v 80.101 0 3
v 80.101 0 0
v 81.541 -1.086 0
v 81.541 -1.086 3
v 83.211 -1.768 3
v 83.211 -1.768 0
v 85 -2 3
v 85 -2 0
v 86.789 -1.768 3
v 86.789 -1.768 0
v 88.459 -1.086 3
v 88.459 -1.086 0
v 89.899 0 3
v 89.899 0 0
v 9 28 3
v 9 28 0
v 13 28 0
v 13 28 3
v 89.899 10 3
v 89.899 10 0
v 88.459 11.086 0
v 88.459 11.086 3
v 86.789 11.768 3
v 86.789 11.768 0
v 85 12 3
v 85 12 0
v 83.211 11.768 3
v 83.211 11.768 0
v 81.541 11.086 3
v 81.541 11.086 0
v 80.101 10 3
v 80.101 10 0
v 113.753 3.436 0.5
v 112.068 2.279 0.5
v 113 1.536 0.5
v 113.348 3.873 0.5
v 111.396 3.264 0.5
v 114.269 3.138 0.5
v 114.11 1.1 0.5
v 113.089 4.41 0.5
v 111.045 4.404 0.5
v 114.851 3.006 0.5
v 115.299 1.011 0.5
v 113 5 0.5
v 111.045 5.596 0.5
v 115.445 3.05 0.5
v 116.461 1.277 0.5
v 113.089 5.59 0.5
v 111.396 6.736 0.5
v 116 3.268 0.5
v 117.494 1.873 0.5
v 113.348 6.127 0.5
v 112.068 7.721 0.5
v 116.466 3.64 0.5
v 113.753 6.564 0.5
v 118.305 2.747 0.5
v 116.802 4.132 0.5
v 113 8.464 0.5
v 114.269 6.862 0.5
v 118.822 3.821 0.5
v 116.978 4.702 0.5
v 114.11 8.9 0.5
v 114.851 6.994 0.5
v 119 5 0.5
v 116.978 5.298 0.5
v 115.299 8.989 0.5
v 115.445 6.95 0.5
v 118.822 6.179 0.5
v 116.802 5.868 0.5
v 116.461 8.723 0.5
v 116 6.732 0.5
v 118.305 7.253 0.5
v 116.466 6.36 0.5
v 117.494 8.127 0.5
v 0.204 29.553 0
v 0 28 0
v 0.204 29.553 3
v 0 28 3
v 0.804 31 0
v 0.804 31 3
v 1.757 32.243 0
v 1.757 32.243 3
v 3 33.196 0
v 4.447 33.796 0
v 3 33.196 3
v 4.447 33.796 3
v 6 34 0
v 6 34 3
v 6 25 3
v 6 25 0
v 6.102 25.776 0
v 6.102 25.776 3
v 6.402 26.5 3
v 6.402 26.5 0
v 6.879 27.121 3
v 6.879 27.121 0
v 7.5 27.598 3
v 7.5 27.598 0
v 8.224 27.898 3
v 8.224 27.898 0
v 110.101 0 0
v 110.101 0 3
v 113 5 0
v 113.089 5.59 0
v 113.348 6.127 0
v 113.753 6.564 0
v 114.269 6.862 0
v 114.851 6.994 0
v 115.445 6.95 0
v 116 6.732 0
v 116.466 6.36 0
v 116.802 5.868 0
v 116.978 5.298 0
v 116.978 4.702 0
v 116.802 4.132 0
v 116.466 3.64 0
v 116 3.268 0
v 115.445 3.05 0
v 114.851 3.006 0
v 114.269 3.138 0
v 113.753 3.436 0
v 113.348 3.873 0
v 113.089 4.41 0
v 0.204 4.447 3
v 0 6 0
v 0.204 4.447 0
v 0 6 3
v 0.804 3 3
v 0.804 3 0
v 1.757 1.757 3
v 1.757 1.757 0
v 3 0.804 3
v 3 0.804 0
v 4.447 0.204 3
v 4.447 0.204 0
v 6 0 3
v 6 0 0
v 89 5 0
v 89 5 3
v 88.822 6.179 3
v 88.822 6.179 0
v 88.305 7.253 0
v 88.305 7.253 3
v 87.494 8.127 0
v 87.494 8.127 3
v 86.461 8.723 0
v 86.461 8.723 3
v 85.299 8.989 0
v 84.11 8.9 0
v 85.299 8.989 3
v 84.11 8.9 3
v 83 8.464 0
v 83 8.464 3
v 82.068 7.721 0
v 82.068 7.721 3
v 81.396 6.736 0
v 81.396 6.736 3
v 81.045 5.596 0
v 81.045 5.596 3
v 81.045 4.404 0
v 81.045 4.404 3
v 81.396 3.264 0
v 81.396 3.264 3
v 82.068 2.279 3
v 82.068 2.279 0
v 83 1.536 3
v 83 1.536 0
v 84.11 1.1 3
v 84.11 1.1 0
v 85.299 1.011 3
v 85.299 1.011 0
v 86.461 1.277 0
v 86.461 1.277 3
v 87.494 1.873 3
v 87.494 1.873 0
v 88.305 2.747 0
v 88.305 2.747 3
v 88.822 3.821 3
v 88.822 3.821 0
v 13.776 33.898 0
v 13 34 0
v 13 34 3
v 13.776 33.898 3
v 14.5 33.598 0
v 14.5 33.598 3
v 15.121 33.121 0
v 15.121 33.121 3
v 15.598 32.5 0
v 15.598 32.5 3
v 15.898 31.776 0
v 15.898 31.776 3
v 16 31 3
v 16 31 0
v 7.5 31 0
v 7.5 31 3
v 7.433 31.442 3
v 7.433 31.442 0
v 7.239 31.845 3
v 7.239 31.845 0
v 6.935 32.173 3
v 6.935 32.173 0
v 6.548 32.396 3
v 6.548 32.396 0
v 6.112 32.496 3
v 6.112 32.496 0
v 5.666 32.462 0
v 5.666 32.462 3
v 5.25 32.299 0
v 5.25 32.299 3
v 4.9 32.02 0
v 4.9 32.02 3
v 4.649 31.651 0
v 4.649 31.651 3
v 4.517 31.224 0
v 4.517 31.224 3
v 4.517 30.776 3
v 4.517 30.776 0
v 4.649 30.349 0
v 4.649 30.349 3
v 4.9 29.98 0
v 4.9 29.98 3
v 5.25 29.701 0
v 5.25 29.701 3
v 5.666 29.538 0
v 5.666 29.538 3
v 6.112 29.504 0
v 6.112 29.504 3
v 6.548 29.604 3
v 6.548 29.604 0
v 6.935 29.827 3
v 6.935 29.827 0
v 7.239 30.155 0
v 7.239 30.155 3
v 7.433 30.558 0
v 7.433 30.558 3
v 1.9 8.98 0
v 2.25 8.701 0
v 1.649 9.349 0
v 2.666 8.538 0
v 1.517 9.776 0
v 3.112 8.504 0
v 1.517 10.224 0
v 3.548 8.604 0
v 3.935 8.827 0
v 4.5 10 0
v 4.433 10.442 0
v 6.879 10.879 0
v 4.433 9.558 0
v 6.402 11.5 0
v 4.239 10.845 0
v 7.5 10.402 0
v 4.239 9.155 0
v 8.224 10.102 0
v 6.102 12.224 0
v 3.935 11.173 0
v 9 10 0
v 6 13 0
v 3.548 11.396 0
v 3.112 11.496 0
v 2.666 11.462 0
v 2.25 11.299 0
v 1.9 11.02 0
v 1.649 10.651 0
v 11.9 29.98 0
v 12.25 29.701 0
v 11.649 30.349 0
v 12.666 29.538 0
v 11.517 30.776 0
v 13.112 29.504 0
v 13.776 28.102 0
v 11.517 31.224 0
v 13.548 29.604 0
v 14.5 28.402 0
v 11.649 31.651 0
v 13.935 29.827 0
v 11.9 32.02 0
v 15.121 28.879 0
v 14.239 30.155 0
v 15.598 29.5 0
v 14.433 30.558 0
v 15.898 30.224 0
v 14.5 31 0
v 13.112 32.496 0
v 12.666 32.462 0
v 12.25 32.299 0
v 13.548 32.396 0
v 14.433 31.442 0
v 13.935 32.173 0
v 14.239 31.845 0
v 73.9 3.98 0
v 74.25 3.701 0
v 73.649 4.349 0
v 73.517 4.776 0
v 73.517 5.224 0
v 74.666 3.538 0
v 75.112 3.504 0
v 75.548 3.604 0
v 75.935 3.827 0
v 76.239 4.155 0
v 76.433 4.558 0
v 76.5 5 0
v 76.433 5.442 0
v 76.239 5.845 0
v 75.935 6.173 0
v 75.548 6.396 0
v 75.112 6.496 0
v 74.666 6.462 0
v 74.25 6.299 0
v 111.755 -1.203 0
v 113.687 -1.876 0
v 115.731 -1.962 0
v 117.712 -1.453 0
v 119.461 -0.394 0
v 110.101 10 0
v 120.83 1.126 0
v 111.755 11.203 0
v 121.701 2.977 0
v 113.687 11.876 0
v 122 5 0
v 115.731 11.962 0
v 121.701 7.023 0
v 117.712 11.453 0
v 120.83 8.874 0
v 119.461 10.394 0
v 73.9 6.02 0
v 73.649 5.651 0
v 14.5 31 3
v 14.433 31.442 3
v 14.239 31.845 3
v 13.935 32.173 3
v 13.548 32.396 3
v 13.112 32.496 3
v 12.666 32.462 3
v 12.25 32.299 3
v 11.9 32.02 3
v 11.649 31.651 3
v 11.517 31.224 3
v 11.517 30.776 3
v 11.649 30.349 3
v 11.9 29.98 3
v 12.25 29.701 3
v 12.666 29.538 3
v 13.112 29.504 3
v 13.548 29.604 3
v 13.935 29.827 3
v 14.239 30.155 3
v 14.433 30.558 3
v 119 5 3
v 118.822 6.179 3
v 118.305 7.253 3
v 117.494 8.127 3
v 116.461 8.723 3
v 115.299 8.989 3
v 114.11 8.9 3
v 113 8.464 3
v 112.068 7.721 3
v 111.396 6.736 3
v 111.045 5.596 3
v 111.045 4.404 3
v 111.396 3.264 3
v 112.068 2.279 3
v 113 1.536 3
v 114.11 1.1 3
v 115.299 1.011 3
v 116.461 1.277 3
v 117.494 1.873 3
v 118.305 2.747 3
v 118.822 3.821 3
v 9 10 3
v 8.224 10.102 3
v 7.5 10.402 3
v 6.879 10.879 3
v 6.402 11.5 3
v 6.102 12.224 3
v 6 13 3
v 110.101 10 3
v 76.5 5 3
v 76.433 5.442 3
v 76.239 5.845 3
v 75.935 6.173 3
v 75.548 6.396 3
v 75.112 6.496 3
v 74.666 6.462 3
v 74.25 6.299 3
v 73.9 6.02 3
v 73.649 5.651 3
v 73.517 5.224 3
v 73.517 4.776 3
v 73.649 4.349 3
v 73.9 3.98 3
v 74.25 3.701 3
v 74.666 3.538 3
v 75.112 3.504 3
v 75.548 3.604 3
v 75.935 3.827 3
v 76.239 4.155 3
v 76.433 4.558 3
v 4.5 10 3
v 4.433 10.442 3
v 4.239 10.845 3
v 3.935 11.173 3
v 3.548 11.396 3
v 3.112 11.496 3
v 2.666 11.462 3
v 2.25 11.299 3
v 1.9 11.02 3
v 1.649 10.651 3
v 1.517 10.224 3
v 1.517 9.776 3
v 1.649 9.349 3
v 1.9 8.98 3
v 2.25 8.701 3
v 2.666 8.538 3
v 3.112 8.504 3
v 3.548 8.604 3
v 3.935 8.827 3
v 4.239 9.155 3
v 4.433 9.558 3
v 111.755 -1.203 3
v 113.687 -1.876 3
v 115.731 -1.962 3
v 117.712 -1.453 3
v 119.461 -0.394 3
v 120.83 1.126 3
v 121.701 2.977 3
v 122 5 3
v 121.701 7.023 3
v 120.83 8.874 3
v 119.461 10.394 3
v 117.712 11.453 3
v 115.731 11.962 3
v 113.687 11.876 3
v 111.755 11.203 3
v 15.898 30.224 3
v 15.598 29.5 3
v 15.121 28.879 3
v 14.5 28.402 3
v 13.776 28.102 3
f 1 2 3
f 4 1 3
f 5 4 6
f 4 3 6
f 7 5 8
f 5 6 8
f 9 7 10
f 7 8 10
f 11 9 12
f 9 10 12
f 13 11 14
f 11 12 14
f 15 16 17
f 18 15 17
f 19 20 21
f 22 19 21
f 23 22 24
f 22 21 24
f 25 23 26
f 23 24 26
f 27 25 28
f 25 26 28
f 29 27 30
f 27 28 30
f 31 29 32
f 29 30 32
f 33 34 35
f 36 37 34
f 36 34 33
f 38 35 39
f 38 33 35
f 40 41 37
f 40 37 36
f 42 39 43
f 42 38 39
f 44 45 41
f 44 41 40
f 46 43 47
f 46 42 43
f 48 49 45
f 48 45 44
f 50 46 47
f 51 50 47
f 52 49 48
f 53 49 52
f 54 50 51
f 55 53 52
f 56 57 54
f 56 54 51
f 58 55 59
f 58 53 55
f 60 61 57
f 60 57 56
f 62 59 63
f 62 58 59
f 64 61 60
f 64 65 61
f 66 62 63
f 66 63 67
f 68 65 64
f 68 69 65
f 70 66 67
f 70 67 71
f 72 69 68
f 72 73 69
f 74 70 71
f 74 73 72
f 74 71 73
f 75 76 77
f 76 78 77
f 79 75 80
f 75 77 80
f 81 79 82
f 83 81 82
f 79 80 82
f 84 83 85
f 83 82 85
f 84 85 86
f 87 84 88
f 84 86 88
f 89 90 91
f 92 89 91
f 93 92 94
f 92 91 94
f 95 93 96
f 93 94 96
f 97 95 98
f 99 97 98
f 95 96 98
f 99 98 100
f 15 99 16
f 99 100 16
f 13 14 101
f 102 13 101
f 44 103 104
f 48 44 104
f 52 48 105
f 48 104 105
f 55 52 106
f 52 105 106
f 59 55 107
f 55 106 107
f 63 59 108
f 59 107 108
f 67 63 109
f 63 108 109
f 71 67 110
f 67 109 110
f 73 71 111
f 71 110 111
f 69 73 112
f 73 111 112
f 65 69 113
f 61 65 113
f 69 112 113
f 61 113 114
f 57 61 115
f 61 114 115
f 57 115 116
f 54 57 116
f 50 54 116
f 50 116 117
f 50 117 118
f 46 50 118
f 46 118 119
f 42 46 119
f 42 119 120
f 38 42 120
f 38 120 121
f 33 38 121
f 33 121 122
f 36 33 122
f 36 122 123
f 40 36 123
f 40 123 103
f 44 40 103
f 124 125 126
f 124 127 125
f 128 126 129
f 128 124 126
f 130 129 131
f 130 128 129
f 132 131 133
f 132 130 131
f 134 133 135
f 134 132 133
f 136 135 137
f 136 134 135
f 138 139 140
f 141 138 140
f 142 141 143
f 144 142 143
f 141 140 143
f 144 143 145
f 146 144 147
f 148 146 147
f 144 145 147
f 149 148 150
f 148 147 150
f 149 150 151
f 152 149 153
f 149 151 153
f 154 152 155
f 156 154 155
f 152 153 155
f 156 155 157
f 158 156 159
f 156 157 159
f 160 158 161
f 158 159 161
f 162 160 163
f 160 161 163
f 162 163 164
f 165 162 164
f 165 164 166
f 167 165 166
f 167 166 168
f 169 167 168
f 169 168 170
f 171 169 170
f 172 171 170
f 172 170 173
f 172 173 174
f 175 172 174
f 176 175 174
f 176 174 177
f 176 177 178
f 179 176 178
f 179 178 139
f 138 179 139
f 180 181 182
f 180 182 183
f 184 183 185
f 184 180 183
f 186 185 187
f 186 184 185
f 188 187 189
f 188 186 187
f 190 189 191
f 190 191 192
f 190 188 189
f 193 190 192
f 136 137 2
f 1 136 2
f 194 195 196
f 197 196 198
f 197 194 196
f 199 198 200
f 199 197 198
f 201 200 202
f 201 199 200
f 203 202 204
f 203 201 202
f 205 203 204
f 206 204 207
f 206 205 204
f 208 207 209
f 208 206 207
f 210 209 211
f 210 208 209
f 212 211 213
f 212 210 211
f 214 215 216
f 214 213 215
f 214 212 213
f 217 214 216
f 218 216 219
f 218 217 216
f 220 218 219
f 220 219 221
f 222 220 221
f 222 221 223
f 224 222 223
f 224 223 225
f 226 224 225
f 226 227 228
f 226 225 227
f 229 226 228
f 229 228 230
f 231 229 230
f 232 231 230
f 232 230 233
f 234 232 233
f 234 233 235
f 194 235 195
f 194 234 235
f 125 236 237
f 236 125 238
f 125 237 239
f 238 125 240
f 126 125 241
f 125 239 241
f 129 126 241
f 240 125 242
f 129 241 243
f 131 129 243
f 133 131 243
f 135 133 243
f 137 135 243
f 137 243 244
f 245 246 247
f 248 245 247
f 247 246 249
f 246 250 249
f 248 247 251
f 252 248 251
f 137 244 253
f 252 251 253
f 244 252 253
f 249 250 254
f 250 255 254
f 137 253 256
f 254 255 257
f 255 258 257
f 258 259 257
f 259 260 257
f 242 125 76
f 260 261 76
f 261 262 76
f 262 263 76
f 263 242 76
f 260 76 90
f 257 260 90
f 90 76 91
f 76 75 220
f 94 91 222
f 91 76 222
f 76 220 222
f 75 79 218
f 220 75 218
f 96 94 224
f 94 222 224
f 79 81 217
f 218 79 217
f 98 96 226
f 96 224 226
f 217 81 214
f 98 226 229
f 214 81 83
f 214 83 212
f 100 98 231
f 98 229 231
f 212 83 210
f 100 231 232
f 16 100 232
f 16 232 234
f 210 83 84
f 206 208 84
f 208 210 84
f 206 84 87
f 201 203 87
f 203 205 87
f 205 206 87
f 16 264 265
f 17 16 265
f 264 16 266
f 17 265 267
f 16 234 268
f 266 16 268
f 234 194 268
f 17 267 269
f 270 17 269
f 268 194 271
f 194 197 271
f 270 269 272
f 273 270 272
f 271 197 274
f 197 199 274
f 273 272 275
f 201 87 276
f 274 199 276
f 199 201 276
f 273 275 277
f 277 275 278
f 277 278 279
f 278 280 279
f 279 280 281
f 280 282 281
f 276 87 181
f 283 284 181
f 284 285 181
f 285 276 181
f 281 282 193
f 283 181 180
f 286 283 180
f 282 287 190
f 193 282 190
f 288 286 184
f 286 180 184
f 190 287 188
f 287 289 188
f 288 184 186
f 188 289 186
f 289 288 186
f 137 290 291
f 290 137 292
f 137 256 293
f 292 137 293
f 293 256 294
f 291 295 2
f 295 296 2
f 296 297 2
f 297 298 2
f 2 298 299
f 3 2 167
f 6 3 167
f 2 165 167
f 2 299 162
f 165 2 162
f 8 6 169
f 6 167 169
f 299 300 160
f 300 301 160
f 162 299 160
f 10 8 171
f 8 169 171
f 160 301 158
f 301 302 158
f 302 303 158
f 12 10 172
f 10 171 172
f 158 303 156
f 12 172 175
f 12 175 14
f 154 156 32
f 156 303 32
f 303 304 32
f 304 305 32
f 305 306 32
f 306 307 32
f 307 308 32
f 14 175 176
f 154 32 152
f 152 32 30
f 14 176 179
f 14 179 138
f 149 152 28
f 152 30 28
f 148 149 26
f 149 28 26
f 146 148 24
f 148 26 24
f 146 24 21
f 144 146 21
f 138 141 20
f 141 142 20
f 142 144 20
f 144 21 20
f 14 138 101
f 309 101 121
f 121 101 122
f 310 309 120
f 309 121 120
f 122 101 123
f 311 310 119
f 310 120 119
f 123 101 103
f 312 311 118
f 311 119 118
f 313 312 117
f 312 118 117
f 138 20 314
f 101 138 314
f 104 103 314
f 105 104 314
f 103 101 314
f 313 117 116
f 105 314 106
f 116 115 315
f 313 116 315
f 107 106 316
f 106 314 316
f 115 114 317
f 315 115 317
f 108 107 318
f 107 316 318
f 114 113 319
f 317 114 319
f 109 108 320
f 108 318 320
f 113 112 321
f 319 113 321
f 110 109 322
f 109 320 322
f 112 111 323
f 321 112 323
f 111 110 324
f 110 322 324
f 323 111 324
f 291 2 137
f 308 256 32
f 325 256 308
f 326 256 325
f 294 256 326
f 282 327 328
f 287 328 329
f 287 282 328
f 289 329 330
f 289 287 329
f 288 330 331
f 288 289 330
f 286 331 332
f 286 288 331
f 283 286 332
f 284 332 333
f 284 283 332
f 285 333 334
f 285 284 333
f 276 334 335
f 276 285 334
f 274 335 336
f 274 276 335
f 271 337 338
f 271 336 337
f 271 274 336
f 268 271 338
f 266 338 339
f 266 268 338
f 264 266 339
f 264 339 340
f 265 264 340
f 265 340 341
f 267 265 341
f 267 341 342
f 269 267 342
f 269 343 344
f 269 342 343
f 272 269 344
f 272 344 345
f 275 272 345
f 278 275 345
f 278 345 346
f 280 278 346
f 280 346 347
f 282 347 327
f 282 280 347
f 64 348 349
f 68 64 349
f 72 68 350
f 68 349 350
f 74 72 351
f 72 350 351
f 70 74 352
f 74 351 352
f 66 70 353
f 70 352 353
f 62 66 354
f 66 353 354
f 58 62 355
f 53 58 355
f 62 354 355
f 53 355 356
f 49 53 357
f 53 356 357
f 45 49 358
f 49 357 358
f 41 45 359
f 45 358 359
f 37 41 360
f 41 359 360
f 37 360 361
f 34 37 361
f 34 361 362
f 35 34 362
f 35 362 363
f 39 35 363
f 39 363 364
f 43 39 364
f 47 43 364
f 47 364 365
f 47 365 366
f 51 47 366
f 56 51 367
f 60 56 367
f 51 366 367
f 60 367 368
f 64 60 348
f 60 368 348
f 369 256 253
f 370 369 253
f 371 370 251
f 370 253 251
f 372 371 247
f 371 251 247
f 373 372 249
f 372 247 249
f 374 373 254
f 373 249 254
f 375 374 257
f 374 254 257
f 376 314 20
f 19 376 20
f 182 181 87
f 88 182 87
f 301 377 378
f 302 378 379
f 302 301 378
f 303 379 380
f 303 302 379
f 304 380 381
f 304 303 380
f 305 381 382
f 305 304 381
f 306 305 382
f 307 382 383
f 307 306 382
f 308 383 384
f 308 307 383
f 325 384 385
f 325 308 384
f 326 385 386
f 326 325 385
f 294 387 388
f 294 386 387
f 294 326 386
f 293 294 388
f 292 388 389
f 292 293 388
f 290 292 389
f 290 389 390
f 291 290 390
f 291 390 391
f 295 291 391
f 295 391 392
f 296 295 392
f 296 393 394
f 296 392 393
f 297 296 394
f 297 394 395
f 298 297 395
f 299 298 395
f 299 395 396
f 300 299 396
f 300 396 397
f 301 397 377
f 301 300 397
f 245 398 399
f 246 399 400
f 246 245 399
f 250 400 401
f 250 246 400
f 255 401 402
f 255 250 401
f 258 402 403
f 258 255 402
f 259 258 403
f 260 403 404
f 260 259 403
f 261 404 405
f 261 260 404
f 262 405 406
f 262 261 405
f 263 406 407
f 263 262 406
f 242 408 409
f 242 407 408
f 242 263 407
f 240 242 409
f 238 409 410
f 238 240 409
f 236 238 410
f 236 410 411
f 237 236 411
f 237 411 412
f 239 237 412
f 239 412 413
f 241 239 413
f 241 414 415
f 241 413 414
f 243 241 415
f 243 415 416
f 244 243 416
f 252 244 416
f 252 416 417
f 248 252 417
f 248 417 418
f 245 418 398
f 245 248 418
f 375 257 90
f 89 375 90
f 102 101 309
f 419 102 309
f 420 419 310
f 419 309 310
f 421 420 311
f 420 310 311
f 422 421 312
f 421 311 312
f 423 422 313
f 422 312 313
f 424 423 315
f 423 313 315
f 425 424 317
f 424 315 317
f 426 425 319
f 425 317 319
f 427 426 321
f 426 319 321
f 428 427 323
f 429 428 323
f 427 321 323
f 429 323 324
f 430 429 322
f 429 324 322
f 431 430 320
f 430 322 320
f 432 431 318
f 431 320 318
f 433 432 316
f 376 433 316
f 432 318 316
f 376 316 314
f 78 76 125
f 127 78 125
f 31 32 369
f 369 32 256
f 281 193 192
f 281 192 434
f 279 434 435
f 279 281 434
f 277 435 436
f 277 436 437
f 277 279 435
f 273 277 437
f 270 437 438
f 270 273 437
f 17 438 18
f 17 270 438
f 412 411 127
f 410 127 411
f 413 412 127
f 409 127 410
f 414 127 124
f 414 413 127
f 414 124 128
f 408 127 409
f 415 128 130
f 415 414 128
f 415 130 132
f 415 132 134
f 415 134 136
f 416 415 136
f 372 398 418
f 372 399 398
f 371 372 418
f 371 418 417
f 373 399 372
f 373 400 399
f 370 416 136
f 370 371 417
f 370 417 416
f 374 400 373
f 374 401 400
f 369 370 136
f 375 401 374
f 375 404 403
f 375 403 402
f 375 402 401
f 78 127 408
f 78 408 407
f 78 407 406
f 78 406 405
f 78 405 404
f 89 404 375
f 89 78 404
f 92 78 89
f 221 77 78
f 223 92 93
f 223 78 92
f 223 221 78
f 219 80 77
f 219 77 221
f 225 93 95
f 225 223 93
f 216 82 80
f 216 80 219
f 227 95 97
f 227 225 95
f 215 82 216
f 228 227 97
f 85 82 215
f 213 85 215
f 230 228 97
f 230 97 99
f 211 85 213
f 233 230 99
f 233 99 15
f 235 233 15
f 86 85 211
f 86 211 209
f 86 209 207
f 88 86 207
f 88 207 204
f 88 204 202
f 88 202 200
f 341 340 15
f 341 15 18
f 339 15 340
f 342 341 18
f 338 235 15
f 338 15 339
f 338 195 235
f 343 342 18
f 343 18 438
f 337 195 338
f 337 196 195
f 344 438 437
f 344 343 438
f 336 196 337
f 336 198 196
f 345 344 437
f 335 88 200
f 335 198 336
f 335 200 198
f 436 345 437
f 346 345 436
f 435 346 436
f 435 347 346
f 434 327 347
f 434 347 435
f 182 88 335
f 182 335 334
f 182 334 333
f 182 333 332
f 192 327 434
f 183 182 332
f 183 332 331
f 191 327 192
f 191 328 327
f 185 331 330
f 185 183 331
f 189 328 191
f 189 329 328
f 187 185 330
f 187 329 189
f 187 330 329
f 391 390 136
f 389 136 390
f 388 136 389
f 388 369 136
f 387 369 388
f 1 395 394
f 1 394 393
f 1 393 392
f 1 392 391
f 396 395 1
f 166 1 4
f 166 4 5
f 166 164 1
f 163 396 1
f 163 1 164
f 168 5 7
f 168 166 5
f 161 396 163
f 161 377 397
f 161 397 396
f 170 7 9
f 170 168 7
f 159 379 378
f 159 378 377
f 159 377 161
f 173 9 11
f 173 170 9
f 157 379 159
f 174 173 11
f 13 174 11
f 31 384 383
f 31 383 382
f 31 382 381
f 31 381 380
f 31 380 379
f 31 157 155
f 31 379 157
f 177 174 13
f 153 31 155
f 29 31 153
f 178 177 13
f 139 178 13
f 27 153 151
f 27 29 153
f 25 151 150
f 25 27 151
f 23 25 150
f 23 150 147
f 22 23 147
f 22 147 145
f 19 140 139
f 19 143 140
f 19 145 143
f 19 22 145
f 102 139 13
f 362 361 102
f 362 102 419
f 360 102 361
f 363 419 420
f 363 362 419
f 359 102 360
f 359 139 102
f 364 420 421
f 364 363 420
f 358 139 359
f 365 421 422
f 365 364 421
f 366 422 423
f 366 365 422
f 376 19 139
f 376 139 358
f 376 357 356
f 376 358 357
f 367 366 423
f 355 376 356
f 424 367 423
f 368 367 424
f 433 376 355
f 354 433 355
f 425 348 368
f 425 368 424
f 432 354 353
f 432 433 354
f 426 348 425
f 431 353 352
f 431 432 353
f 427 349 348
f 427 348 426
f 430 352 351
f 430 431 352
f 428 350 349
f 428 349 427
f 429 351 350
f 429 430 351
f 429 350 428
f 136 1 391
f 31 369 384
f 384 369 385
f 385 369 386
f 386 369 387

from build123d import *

# Parameters (mm, degrees)
EXTRUDE_1_DEPTH     = 3
SKETCH_3_R          = 4
CUT_EXTRUDE_1_DEPTH = 2.5
FILLET_START        = -1
FILLET_1_DEPTH      = 5
FILLET_1_2_DEPTH    = 3
FILLET_2_R          = 6
SKETCH_4_R          = 4
CUT_EXTRUDE_2_DEPTH = 4
SKETCH_5_R          = 1.5
CUT_EXTRUDE_4_DEPTH = 10
SKETCH_6_R          = 2
CUT_EXTRUDE_5_DEPTH = 10


with BuildPart() as part:
    # 草图1 → 凸台-拉伸1 (new body)
    with BuildSketch(Plane.XY):
        with BuildLine():
            Line((0, 0), (80.101020514, 0))
            ThreePointArc((80.101020514, 0), (85, -2), (89.898979486, 0))
            Line((89.898979486, 0), (110.101020514, 0))
            ThreePointArc((110.101020514, 0), (122, 5), (110.101020514, 10))
            Line((110.101020514, 10), (89.898979486, 10))
            ThreePointArc((89.898979486, 10), (85, 12), (80.101020514, 10))
            Line((80.101020514, 10), (6, 10))
            Line((6, 10), (6, 28))
            Line((6, 28), (16, 28))
            Line((16, 28), (16, 34))
            Line((16, 34), (0, 34))
            Line((0, 34), (0, 0))
        make_face()
    extrude(amount=EXTRUDE_1_DEPTH)

    # 草图3 → 切除-拉伸1 (cut)
    with BuildSketch(Plane.XY.offset(3)):
        with Locations((115, 5)):
            Circle(SKETCH_3_R)
    extrude(amount=-CUT_EXTRUDE_1_DEPTH, mode=Mode.SUBTRACT)

    # 圆角1: read off the stored shape, not the designer's step
    # 圆角1 outline → 圆角1 (cut)
    with BuildSketch(Plane.XY.offset(FILLET_START)):
        with BuildLine():
            ThreePointArc((13, 34), (15.121320344, 33.121320344), (16, 31))
            Line((16, 31), (16, 34))
            Line((16, 34), (13, 34))
        make_face()
        with BuildLine():
            ThreePointArc((16, 31), (15.121320344, 28.878679656), (13, 28))
            Line((13, 28), (16, 28))
            Line((16, 28), (16, 31))
        make_face()
    extrude(amount=FILLET_1_DEPTH, mode=Mode.SUBTRACT)

    # Fillet 1 2 outline → Fillet 1 2 (add)
    with BuildSketch(Plane.XY):
        with BuildLine():
            Line((6, 28), (6, 25))
            ThreePointArc((6, 25), (6.878679656, 27.121320344), (9, 28))
            Line((9, 28), (6, 28))
        make_face()
        with BuildLine():
            ThreePointArc((9, 10), (6.878679656, 10.878679656), (6, 13))
            Line((6, 13), (6, 10))
            Line((6, 10), (9, 10))
        make_face()
    extrude(amount=FILLET_1_2_DEPTH)

    # 圆角2
    fillet_2_edges = [part.edges().sort_by_distance(p)[0] for p in [
        (0, 34, 1.5),
        (0, 0, 1.5),
    ]]
    fillet(fillet_2_edges, radius=FILLET_2_R)

    # 草图4 → 切除-拉伸2 (cut)
    with BuildSketch(Plane.XY.offset(3)):
        with Locations((85, 5)):
            Circle(SKETCH_4_R)
    extrude(amount=-CUT_EXTRUDE_2_DEPTH, mode=Mode.SUBTRACT)

    # 草图5 → 切除-拉伸4 (cut)
    with BuildSketch(Plane.XY):
        with Locations((75, 5)):
            Circle(SKETCH_5_R)
        with Locations((3, 10)):
            Circle(SKETCH_5_R)
        with Locations((13, 31)):
            Circle(SKETCH_5_R)
        with Locations((6, 31)):
            Circle(SKETCH_5_R)
    extrude(amount=CUT_EXTRUDE_4_DEPTH, mode=Mode.SUBTRACT)

    # 草图6 → 切除-拉伸5 (cut)
    with BuildSketch(Plane(origin=(0, 0, 0), x_dir=(-1, 0, 0), z_dir=(0, 0, -1))):
        with Locations((-115, 5)):
            Circle(SKETCH_6_R)
    extrude(amount=-CUT_EXTRUDE_5_DEPTH, mode=Mode.SUBTRACT)


solid = part.part
